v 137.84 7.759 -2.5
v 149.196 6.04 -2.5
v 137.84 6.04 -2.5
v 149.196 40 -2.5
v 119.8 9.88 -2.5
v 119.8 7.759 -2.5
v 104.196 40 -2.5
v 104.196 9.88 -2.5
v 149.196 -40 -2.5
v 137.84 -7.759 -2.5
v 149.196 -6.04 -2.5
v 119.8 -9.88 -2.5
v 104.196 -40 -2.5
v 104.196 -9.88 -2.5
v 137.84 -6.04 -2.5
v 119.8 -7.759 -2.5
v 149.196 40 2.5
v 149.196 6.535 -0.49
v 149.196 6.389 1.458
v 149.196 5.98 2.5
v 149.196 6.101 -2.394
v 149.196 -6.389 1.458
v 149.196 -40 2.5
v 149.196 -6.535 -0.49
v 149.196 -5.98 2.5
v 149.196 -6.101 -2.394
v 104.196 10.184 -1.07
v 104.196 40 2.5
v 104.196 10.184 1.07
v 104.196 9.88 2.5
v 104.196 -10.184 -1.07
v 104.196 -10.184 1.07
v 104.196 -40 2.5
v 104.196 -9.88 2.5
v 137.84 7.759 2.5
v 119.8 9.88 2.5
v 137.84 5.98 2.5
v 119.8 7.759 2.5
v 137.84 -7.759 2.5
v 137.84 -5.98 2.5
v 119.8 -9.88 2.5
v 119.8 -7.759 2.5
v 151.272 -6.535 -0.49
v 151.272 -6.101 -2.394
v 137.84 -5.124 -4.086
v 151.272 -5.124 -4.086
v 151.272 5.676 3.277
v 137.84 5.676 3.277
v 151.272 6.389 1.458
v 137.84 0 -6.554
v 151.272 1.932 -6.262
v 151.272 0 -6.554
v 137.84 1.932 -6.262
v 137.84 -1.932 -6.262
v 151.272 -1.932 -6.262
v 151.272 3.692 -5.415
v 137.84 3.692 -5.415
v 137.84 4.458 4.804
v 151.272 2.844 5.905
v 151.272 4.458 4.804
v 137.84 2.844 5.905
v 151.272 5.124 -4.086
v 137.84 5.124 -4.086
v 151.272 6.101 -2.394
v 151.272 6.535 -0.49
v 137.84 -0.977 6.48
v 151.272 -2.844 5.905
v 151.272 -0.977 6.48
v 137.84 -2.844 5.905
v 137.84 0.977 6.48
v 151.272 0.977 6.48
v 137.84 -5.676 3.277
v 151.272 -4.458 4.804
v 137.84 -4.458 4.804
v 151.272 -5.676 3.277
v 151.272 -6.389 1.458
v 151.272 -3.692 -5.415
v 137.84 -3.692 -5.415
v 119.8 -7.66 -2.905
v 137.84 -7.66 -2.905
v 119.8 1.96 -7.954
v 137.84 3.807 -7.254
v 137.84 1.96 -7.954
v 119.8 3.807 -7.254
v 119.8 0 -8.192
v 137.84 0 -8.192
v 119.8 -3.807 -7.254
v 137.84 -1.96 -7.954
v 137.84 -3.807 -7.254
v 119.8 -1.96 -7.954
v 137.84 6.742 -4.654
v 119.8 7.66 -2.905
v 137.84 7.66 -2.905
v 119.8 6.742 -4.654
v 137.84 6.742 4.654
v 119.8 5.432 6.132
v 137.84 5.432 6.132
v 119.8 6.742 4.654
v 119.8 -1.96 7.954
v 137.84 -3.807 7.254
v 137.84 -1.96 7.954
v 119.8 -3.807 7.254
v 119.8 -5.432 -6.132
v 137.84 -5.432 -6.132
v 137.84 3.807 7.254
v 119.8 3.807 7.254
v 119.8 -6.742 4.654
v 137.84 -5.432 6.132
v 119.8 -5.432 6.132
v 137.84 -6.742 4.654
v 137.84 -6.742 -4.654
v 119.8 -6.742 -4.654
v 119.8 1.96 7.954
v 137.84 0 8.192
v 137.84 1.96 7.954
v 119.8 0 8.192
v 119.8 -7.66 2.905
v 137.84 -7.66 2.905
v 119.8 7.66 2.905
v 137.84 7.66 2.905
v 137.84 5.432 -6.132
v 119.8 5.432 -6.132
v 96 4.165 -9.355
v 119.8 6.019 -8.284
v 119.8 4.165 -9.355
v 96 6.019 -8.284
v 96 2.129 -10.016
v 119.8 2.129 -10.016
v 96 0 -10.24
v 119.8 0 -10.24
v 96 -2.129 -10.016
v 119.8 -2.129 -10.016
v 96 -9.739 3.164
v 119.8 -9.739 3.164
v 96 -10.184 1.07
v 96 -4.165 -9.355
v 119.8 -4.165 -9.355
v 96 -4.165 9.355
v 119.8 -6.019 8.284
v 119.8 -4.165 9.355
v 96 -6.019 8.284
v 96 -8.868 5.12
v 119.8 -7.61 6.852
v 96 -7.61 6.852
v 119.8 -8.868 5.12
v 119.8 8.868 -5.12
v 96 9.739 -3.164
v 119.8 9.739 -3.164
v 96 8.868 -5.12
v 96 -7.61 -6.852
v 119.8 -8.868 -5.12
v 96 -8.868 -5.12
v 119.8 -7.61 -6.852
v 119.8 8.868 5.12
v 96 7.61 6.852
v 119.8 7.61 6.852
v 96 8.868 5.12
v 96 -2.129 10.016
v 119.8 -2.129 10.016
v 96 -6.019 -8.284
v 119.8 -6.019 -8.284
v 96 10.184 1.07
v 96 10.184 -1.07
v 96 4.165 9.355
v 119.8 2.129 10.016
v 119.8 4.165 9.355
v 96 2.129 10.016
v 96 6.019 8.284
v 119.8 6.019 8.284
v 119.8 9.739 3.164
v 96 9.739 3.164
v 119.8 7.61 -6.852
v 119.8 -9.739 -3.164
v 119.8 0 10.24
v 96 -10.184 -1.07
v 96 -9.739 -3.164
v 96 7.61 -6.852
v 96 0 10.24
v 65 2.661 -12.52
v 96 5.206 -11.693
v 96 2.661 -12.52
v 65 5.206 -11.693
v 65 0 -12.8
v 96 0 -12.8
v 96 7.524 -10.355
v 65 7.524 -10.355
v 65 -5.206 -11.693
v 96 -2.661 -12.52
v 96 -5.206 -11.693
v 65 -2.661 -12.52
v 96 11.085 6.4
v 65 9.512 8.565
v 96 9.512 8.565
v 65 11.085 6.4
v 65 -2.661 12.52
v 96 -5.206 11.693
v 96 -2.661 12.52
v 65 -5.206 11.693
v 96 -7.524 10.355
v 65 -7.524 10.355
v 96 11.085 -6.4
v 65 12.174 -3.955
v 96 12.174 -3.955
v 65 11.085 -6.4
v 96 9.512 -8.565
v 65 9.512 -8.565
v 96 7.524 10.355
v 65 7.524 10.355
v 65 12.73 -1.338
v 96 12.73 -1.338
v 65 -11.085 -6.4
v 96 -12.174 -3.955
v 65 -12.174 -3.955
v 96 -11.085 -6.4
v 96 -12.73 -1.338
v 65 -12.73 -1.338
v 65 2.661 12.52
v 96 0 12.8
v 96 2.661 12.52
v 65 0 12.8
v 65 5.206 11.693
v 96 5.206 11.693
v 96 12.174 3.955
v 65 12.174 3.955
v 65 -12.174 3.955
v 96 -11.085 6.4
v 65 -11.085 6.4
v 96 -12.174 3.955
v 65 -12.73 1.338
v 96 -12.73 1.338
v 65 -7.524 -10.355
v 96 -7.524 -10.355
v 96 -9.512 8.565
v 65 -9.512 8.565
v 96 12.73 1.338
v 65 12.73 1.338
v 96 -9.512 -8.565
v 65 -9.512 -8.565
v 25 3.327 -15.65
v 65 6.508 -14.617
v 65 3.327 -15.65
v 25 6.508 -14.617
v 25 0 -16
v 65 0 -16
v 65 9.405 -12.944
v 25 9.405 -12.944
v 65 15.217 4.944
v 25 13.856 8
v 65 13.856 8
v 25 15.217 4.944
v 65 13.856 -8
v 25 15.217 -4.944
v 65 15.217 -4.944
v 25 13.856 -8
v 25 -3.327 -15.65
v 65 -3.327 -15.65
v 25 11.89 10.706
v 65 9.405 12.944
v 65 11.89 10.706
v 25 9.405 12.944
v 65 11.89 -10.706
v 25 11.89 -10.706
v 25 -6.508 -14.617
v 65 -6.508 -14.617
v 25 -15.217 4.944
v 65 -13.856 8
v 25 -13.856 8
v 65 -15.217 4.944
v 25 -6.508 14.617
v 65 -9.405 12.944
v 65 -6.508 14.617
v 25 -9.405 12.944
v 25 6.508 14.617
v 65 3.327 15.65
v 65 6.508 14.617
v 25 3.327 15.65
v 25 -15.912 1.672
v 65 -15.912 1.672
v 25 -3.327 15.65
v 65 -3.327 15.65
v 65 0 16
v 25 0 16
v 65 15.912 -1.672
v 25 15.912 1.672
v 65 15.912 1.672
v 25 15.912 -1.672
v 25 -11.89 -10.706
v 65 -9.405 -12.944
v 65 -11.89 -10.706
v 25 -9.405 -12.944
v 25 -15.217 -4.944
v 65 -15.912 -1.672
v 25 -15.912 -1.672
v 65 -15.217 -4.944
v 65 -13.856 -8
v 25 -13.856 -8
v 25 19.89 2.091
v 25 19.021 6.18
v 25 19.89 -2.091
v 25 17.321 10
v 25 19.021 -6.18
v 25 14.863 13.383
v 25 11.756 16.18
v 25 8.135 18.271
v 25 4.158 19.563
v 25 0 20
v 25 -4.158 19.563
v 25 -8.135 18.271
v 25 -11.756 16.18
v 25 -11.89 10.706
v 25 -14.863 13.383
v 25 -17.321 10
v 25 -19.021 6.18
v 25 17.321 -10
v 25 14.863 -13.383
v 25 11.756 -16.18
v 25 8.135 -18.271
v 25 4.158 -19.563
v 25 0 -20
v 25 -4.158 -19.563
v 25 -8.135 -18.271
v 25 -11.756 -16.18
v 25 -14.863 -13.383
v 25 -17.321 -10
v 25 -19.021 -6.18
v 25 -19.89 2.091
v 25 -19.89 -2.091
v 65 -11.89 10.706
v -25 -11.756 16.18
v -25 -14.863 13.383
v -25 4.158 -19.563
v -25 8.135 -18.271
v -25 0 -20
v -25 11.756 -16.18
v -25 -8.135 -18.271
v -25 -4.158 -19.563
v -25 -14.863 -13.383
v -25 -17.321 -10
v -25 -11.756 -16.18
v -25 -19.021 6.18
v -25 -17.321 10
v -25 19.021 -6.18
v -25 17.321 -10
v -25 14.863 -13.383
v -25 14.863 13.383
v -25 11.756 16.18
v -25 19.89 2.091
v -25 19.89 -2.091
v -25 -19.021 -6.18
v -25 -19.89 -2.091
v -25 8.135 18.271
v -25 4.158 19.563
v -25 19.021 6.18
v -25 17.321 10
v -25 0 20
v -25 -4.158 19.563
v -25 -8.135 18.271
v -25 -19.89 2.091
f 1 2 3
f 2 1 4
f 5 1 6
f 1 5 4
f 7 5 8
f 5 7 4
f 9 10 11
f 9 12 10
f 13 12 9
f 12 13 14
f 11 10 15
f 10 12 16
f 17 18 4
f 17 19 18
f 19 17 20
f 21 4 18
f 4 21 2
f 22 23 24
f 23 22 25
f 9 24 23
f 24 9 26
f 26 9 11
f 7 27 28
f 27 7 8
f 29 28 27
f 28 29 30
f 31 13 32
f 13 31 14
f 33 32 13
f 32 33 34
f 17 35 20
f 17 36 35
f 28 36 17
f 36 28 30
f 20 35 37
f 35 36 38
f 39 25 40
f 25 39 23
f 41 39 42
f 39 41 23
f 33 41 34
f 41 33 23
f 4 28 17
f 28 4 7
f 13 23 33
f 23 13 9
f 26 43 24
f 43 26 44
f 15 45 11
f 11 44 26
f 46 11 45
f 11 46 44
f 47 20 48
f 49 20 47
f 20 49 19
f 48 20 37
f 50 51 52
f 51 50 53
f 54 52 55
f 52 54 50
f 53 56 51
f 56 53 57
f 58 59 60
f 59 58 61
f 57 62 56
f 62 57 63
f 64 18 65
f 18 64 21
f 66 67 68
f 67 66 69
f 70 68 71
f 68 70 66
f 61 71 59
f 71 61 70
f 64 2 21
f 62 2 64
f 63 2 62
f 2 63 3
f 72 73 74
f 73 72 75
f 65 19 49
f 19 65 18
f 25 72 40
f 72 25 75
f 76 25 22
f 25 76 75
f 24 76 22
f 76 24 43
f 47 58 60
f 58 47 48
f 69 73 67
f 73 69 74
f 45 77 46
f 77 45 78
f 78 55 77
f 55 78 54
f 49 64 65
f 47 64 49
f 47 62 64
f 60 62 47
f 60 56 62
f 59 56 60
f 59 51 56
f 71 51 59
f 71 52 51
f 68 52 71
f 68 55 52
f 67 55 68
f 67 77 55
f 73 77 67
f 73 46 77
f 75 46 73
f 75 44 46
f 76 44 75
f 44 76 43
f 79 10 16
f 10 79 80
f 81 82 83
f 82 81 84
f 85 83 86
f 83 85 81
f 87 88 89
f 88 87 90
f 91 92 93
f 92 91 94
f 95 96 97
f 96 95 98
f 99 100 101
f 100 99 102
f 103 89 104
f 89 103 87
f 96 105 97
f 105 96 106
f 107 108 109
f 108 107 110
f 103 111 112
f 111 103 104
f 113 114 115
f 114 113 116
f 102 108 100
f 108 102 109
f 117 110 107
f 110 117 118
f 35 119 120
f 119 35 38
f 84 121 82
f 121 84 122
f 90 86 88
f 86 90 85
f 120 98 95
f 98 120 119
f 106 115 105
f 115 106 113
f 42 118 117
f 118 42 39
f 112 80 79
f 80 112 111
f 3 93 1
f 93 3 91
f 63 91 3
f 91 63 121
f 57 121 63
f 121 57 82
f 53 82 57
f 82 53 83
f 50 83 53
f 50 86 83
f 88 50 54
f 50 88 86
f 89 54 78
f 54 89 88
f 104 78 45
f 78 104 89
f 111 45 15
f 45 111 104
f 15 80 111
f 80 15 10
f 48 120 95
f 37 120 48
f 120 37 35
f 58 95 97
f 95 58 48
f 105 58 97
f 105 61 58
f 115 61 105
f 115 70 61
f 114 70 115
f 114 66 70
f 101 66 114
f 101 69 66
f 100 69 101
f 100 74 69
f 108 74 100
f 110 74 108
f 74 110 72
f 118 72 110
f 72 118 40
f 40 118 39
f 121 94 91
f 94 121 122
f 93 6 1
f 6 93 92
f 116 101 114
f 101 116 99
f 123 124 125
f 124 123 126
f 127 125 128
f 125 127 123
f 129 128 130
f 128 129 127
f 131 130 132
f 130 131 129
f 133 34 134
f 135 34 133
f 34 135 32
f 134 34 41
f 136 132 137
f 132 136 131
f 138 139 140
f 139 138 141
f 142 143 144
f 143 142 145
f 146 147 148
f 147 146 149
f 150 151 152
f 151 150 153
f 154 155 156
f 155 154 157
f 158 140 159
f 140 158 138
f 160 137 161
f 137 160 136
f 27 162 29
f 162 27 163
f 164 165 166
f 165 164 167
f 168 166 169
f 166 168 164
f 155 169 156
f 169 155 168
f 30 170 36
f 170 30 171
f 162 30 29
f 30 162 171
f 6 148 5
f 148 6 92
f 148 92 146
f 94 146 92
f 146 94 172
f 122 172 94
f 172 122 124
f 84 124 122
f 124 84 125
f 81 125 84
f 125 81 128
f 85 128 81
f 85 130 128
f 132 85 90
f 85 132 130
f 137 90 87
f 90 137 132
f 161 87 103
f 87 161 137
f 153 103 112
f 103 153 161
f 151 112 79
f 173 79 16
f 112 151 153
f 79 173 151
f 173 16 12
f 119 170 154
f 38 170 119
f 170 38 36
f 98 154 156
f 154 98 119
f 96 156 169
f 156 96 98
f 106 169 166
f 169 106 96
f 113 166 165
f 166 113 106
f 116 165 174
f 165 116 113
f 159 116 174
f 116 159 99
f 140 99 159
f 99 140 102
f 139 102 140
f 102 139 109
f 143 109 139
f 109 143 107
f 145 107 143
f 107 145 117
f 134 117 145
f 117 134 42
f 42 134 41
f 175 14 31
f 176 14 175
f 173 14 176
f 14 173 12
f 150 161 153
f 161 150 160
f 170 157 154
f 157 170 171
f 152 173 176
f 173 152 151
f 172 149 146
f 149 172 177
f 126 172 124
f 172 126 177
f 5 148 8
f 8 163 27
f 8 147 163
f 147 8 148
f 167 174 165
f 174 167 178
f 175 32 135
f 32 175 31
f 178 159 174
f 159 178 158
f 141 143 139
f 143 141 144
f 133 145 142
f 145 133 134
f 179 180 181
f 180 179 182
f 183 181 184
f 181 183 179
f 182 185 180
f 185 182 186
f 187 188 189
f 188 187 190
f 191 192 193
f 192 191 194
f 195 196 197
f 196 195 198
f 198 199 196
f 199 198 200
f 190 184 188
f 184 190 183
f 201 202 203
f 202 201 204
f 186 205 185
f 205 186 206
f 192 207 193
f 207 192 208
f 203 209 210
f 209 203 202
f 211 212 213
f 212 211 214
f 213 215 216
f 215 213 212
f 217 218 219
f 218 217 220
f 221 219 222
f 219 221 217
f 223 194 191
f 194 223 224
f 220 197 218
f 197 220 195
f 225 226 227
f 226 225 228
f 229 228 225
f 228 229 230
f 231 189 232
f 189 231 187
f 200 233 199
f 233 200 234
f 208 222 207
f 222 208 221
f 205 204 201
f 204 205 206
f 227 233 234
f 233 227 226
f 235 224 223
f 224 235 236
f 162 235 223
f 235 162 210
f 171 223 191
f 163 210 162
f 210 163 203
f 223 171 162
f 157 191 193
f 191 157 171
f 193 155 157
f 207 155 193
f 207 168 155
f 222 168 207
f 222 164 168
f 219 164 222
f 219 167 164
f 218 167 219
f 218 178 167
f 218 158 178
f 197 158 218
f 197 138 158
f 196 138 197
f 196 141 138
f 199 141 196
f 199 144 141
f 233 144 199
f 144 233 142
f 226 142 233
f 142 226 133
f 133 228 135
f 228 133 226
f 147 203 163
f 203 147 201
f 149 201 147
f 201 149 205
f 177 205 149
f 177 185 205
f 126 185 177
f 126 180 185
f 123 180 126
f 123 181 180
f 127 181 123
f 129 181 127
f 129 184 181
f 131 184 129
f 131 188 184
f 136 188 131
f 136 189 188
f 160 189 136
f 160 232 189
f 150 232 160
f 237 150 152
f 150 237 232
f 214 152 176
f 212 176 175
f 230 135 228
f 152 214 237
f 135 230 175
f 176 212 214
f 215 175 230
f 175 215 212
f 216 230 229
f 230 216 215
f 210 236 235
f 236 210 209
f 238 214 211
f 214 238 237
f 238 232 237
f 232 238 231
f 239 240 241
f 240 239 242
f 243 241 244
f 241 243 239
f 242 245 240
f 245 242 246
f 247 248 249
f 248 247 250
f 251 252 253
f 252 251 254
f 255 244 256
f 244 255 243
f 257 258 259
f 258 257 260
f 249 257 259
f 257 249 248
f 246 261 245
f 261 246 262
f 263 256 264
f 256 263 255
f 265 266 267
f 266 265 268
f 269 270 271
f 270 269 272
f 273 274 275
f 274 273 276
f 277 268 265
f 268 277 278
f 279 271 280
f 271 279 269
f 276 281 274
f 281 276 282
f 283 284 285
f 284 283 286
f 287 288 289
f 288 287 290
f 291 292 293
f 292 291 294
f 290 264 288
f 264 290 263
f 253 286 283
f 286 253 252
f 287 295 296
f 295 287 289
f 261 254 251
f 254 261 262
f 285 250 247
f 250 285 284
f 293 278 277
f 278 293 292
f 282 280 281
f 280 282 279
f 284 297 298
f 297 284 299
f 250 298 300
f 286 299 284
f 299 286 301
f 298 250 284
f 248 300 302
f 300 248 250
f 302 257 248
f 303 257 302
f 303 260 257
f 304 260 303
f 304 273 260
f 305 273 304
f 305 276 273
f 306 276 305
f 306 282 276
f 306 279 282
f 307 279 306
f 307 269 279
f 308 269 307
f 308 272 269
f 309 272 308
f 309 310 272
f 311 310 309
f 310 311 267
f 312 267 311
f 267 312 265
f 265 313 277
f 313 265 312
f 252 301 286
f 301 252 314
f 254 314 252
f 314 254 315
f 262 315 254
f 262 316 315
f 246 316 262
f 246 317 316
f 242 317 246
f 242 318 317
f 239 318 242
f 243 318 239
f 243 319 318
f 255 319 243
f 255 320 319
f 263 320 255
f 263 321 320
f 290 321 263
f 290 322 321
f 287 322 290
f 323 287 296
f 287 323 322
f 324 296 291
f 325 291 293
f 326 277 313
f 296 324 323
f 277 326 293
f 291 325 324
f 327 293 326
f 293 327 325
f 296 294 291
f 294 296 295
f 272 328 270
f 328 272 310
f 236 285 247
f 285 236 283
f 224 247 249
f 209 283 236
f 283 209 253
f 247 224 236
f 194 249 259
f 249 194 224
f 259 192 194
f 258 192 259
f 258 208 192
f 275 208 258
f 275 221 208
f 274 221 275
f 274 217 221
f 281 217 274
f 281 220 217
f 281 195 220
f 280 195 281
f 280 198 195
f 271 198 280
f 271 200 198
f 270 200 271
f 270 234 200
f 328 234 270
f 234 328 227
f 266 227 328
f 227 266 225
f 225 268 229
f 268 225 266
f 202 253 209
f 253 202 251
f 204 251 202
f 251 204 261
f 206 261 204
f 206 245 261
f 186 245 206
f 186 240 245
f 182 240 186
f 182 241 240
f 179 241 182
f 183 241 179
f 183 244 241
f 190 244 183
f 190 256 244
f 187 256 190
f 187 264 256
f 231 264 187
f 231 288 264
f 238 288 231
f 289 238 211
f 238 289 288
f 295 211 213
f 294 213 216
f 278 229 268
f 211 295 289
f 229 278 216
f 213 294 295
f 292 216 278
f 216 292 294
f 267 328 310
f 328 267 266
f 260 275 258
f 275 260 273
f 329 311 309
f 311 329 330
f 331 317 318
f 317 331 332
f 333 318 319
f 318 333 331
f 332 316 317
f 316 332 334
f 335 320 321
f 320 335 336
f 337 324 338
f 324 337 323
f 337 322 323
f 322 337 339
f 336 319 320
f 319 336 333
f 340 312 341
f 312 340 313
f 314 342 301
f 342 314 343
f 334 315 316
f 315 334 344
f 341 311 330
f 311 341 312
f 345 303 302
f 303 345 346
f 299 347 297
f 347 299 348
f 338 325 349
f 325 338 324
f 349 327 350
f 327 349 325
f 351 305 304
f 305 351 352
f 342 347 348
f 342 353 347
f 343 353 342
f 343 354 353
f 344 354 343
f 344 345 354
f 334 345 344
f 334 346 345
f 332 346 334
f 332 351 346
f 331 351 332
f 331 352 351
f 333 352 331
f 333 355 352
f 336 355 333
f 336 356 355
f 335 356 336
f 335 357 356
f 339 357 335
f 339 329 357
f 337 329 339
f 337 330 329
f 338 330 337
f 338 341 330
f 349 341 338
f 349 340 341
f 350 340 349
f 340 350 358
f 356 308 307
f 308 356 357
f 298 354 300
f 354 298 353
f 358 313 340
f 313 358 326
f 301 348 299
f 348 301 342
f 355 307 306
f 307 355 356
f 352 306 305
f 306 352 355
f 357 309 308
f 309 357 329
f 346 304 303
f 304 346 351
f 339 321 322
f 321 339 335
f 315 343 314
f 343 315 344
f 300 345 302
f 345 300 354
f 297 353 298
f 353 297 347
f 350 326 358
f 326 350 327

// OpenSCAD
height = 50;
radius = 20;
levels = 5;
fin_height = 45; 
fin_width = 80; 
fin_length = 5; 


module createConeLike(h, r, level) {
    if (level == 0) {
        translate([0, 0, -h]) {
            cube([fin_length, fin_width, fin_height], center=true); 
        }
        
        cylinder(h, r, r, center=true);     } else {
        cylinder(h, r, r, center=true);
        
        nextHeight = h * 0.8;
        nextRadius = r * 0.8;
        
        translate([0, 0, h-5]) {
            createConeLike(nextHeight, nextRadius, level - 1);
        }
    }
}

rotate([0, 90, 0]) {
    createConeLike(height, radius, levels);
}
